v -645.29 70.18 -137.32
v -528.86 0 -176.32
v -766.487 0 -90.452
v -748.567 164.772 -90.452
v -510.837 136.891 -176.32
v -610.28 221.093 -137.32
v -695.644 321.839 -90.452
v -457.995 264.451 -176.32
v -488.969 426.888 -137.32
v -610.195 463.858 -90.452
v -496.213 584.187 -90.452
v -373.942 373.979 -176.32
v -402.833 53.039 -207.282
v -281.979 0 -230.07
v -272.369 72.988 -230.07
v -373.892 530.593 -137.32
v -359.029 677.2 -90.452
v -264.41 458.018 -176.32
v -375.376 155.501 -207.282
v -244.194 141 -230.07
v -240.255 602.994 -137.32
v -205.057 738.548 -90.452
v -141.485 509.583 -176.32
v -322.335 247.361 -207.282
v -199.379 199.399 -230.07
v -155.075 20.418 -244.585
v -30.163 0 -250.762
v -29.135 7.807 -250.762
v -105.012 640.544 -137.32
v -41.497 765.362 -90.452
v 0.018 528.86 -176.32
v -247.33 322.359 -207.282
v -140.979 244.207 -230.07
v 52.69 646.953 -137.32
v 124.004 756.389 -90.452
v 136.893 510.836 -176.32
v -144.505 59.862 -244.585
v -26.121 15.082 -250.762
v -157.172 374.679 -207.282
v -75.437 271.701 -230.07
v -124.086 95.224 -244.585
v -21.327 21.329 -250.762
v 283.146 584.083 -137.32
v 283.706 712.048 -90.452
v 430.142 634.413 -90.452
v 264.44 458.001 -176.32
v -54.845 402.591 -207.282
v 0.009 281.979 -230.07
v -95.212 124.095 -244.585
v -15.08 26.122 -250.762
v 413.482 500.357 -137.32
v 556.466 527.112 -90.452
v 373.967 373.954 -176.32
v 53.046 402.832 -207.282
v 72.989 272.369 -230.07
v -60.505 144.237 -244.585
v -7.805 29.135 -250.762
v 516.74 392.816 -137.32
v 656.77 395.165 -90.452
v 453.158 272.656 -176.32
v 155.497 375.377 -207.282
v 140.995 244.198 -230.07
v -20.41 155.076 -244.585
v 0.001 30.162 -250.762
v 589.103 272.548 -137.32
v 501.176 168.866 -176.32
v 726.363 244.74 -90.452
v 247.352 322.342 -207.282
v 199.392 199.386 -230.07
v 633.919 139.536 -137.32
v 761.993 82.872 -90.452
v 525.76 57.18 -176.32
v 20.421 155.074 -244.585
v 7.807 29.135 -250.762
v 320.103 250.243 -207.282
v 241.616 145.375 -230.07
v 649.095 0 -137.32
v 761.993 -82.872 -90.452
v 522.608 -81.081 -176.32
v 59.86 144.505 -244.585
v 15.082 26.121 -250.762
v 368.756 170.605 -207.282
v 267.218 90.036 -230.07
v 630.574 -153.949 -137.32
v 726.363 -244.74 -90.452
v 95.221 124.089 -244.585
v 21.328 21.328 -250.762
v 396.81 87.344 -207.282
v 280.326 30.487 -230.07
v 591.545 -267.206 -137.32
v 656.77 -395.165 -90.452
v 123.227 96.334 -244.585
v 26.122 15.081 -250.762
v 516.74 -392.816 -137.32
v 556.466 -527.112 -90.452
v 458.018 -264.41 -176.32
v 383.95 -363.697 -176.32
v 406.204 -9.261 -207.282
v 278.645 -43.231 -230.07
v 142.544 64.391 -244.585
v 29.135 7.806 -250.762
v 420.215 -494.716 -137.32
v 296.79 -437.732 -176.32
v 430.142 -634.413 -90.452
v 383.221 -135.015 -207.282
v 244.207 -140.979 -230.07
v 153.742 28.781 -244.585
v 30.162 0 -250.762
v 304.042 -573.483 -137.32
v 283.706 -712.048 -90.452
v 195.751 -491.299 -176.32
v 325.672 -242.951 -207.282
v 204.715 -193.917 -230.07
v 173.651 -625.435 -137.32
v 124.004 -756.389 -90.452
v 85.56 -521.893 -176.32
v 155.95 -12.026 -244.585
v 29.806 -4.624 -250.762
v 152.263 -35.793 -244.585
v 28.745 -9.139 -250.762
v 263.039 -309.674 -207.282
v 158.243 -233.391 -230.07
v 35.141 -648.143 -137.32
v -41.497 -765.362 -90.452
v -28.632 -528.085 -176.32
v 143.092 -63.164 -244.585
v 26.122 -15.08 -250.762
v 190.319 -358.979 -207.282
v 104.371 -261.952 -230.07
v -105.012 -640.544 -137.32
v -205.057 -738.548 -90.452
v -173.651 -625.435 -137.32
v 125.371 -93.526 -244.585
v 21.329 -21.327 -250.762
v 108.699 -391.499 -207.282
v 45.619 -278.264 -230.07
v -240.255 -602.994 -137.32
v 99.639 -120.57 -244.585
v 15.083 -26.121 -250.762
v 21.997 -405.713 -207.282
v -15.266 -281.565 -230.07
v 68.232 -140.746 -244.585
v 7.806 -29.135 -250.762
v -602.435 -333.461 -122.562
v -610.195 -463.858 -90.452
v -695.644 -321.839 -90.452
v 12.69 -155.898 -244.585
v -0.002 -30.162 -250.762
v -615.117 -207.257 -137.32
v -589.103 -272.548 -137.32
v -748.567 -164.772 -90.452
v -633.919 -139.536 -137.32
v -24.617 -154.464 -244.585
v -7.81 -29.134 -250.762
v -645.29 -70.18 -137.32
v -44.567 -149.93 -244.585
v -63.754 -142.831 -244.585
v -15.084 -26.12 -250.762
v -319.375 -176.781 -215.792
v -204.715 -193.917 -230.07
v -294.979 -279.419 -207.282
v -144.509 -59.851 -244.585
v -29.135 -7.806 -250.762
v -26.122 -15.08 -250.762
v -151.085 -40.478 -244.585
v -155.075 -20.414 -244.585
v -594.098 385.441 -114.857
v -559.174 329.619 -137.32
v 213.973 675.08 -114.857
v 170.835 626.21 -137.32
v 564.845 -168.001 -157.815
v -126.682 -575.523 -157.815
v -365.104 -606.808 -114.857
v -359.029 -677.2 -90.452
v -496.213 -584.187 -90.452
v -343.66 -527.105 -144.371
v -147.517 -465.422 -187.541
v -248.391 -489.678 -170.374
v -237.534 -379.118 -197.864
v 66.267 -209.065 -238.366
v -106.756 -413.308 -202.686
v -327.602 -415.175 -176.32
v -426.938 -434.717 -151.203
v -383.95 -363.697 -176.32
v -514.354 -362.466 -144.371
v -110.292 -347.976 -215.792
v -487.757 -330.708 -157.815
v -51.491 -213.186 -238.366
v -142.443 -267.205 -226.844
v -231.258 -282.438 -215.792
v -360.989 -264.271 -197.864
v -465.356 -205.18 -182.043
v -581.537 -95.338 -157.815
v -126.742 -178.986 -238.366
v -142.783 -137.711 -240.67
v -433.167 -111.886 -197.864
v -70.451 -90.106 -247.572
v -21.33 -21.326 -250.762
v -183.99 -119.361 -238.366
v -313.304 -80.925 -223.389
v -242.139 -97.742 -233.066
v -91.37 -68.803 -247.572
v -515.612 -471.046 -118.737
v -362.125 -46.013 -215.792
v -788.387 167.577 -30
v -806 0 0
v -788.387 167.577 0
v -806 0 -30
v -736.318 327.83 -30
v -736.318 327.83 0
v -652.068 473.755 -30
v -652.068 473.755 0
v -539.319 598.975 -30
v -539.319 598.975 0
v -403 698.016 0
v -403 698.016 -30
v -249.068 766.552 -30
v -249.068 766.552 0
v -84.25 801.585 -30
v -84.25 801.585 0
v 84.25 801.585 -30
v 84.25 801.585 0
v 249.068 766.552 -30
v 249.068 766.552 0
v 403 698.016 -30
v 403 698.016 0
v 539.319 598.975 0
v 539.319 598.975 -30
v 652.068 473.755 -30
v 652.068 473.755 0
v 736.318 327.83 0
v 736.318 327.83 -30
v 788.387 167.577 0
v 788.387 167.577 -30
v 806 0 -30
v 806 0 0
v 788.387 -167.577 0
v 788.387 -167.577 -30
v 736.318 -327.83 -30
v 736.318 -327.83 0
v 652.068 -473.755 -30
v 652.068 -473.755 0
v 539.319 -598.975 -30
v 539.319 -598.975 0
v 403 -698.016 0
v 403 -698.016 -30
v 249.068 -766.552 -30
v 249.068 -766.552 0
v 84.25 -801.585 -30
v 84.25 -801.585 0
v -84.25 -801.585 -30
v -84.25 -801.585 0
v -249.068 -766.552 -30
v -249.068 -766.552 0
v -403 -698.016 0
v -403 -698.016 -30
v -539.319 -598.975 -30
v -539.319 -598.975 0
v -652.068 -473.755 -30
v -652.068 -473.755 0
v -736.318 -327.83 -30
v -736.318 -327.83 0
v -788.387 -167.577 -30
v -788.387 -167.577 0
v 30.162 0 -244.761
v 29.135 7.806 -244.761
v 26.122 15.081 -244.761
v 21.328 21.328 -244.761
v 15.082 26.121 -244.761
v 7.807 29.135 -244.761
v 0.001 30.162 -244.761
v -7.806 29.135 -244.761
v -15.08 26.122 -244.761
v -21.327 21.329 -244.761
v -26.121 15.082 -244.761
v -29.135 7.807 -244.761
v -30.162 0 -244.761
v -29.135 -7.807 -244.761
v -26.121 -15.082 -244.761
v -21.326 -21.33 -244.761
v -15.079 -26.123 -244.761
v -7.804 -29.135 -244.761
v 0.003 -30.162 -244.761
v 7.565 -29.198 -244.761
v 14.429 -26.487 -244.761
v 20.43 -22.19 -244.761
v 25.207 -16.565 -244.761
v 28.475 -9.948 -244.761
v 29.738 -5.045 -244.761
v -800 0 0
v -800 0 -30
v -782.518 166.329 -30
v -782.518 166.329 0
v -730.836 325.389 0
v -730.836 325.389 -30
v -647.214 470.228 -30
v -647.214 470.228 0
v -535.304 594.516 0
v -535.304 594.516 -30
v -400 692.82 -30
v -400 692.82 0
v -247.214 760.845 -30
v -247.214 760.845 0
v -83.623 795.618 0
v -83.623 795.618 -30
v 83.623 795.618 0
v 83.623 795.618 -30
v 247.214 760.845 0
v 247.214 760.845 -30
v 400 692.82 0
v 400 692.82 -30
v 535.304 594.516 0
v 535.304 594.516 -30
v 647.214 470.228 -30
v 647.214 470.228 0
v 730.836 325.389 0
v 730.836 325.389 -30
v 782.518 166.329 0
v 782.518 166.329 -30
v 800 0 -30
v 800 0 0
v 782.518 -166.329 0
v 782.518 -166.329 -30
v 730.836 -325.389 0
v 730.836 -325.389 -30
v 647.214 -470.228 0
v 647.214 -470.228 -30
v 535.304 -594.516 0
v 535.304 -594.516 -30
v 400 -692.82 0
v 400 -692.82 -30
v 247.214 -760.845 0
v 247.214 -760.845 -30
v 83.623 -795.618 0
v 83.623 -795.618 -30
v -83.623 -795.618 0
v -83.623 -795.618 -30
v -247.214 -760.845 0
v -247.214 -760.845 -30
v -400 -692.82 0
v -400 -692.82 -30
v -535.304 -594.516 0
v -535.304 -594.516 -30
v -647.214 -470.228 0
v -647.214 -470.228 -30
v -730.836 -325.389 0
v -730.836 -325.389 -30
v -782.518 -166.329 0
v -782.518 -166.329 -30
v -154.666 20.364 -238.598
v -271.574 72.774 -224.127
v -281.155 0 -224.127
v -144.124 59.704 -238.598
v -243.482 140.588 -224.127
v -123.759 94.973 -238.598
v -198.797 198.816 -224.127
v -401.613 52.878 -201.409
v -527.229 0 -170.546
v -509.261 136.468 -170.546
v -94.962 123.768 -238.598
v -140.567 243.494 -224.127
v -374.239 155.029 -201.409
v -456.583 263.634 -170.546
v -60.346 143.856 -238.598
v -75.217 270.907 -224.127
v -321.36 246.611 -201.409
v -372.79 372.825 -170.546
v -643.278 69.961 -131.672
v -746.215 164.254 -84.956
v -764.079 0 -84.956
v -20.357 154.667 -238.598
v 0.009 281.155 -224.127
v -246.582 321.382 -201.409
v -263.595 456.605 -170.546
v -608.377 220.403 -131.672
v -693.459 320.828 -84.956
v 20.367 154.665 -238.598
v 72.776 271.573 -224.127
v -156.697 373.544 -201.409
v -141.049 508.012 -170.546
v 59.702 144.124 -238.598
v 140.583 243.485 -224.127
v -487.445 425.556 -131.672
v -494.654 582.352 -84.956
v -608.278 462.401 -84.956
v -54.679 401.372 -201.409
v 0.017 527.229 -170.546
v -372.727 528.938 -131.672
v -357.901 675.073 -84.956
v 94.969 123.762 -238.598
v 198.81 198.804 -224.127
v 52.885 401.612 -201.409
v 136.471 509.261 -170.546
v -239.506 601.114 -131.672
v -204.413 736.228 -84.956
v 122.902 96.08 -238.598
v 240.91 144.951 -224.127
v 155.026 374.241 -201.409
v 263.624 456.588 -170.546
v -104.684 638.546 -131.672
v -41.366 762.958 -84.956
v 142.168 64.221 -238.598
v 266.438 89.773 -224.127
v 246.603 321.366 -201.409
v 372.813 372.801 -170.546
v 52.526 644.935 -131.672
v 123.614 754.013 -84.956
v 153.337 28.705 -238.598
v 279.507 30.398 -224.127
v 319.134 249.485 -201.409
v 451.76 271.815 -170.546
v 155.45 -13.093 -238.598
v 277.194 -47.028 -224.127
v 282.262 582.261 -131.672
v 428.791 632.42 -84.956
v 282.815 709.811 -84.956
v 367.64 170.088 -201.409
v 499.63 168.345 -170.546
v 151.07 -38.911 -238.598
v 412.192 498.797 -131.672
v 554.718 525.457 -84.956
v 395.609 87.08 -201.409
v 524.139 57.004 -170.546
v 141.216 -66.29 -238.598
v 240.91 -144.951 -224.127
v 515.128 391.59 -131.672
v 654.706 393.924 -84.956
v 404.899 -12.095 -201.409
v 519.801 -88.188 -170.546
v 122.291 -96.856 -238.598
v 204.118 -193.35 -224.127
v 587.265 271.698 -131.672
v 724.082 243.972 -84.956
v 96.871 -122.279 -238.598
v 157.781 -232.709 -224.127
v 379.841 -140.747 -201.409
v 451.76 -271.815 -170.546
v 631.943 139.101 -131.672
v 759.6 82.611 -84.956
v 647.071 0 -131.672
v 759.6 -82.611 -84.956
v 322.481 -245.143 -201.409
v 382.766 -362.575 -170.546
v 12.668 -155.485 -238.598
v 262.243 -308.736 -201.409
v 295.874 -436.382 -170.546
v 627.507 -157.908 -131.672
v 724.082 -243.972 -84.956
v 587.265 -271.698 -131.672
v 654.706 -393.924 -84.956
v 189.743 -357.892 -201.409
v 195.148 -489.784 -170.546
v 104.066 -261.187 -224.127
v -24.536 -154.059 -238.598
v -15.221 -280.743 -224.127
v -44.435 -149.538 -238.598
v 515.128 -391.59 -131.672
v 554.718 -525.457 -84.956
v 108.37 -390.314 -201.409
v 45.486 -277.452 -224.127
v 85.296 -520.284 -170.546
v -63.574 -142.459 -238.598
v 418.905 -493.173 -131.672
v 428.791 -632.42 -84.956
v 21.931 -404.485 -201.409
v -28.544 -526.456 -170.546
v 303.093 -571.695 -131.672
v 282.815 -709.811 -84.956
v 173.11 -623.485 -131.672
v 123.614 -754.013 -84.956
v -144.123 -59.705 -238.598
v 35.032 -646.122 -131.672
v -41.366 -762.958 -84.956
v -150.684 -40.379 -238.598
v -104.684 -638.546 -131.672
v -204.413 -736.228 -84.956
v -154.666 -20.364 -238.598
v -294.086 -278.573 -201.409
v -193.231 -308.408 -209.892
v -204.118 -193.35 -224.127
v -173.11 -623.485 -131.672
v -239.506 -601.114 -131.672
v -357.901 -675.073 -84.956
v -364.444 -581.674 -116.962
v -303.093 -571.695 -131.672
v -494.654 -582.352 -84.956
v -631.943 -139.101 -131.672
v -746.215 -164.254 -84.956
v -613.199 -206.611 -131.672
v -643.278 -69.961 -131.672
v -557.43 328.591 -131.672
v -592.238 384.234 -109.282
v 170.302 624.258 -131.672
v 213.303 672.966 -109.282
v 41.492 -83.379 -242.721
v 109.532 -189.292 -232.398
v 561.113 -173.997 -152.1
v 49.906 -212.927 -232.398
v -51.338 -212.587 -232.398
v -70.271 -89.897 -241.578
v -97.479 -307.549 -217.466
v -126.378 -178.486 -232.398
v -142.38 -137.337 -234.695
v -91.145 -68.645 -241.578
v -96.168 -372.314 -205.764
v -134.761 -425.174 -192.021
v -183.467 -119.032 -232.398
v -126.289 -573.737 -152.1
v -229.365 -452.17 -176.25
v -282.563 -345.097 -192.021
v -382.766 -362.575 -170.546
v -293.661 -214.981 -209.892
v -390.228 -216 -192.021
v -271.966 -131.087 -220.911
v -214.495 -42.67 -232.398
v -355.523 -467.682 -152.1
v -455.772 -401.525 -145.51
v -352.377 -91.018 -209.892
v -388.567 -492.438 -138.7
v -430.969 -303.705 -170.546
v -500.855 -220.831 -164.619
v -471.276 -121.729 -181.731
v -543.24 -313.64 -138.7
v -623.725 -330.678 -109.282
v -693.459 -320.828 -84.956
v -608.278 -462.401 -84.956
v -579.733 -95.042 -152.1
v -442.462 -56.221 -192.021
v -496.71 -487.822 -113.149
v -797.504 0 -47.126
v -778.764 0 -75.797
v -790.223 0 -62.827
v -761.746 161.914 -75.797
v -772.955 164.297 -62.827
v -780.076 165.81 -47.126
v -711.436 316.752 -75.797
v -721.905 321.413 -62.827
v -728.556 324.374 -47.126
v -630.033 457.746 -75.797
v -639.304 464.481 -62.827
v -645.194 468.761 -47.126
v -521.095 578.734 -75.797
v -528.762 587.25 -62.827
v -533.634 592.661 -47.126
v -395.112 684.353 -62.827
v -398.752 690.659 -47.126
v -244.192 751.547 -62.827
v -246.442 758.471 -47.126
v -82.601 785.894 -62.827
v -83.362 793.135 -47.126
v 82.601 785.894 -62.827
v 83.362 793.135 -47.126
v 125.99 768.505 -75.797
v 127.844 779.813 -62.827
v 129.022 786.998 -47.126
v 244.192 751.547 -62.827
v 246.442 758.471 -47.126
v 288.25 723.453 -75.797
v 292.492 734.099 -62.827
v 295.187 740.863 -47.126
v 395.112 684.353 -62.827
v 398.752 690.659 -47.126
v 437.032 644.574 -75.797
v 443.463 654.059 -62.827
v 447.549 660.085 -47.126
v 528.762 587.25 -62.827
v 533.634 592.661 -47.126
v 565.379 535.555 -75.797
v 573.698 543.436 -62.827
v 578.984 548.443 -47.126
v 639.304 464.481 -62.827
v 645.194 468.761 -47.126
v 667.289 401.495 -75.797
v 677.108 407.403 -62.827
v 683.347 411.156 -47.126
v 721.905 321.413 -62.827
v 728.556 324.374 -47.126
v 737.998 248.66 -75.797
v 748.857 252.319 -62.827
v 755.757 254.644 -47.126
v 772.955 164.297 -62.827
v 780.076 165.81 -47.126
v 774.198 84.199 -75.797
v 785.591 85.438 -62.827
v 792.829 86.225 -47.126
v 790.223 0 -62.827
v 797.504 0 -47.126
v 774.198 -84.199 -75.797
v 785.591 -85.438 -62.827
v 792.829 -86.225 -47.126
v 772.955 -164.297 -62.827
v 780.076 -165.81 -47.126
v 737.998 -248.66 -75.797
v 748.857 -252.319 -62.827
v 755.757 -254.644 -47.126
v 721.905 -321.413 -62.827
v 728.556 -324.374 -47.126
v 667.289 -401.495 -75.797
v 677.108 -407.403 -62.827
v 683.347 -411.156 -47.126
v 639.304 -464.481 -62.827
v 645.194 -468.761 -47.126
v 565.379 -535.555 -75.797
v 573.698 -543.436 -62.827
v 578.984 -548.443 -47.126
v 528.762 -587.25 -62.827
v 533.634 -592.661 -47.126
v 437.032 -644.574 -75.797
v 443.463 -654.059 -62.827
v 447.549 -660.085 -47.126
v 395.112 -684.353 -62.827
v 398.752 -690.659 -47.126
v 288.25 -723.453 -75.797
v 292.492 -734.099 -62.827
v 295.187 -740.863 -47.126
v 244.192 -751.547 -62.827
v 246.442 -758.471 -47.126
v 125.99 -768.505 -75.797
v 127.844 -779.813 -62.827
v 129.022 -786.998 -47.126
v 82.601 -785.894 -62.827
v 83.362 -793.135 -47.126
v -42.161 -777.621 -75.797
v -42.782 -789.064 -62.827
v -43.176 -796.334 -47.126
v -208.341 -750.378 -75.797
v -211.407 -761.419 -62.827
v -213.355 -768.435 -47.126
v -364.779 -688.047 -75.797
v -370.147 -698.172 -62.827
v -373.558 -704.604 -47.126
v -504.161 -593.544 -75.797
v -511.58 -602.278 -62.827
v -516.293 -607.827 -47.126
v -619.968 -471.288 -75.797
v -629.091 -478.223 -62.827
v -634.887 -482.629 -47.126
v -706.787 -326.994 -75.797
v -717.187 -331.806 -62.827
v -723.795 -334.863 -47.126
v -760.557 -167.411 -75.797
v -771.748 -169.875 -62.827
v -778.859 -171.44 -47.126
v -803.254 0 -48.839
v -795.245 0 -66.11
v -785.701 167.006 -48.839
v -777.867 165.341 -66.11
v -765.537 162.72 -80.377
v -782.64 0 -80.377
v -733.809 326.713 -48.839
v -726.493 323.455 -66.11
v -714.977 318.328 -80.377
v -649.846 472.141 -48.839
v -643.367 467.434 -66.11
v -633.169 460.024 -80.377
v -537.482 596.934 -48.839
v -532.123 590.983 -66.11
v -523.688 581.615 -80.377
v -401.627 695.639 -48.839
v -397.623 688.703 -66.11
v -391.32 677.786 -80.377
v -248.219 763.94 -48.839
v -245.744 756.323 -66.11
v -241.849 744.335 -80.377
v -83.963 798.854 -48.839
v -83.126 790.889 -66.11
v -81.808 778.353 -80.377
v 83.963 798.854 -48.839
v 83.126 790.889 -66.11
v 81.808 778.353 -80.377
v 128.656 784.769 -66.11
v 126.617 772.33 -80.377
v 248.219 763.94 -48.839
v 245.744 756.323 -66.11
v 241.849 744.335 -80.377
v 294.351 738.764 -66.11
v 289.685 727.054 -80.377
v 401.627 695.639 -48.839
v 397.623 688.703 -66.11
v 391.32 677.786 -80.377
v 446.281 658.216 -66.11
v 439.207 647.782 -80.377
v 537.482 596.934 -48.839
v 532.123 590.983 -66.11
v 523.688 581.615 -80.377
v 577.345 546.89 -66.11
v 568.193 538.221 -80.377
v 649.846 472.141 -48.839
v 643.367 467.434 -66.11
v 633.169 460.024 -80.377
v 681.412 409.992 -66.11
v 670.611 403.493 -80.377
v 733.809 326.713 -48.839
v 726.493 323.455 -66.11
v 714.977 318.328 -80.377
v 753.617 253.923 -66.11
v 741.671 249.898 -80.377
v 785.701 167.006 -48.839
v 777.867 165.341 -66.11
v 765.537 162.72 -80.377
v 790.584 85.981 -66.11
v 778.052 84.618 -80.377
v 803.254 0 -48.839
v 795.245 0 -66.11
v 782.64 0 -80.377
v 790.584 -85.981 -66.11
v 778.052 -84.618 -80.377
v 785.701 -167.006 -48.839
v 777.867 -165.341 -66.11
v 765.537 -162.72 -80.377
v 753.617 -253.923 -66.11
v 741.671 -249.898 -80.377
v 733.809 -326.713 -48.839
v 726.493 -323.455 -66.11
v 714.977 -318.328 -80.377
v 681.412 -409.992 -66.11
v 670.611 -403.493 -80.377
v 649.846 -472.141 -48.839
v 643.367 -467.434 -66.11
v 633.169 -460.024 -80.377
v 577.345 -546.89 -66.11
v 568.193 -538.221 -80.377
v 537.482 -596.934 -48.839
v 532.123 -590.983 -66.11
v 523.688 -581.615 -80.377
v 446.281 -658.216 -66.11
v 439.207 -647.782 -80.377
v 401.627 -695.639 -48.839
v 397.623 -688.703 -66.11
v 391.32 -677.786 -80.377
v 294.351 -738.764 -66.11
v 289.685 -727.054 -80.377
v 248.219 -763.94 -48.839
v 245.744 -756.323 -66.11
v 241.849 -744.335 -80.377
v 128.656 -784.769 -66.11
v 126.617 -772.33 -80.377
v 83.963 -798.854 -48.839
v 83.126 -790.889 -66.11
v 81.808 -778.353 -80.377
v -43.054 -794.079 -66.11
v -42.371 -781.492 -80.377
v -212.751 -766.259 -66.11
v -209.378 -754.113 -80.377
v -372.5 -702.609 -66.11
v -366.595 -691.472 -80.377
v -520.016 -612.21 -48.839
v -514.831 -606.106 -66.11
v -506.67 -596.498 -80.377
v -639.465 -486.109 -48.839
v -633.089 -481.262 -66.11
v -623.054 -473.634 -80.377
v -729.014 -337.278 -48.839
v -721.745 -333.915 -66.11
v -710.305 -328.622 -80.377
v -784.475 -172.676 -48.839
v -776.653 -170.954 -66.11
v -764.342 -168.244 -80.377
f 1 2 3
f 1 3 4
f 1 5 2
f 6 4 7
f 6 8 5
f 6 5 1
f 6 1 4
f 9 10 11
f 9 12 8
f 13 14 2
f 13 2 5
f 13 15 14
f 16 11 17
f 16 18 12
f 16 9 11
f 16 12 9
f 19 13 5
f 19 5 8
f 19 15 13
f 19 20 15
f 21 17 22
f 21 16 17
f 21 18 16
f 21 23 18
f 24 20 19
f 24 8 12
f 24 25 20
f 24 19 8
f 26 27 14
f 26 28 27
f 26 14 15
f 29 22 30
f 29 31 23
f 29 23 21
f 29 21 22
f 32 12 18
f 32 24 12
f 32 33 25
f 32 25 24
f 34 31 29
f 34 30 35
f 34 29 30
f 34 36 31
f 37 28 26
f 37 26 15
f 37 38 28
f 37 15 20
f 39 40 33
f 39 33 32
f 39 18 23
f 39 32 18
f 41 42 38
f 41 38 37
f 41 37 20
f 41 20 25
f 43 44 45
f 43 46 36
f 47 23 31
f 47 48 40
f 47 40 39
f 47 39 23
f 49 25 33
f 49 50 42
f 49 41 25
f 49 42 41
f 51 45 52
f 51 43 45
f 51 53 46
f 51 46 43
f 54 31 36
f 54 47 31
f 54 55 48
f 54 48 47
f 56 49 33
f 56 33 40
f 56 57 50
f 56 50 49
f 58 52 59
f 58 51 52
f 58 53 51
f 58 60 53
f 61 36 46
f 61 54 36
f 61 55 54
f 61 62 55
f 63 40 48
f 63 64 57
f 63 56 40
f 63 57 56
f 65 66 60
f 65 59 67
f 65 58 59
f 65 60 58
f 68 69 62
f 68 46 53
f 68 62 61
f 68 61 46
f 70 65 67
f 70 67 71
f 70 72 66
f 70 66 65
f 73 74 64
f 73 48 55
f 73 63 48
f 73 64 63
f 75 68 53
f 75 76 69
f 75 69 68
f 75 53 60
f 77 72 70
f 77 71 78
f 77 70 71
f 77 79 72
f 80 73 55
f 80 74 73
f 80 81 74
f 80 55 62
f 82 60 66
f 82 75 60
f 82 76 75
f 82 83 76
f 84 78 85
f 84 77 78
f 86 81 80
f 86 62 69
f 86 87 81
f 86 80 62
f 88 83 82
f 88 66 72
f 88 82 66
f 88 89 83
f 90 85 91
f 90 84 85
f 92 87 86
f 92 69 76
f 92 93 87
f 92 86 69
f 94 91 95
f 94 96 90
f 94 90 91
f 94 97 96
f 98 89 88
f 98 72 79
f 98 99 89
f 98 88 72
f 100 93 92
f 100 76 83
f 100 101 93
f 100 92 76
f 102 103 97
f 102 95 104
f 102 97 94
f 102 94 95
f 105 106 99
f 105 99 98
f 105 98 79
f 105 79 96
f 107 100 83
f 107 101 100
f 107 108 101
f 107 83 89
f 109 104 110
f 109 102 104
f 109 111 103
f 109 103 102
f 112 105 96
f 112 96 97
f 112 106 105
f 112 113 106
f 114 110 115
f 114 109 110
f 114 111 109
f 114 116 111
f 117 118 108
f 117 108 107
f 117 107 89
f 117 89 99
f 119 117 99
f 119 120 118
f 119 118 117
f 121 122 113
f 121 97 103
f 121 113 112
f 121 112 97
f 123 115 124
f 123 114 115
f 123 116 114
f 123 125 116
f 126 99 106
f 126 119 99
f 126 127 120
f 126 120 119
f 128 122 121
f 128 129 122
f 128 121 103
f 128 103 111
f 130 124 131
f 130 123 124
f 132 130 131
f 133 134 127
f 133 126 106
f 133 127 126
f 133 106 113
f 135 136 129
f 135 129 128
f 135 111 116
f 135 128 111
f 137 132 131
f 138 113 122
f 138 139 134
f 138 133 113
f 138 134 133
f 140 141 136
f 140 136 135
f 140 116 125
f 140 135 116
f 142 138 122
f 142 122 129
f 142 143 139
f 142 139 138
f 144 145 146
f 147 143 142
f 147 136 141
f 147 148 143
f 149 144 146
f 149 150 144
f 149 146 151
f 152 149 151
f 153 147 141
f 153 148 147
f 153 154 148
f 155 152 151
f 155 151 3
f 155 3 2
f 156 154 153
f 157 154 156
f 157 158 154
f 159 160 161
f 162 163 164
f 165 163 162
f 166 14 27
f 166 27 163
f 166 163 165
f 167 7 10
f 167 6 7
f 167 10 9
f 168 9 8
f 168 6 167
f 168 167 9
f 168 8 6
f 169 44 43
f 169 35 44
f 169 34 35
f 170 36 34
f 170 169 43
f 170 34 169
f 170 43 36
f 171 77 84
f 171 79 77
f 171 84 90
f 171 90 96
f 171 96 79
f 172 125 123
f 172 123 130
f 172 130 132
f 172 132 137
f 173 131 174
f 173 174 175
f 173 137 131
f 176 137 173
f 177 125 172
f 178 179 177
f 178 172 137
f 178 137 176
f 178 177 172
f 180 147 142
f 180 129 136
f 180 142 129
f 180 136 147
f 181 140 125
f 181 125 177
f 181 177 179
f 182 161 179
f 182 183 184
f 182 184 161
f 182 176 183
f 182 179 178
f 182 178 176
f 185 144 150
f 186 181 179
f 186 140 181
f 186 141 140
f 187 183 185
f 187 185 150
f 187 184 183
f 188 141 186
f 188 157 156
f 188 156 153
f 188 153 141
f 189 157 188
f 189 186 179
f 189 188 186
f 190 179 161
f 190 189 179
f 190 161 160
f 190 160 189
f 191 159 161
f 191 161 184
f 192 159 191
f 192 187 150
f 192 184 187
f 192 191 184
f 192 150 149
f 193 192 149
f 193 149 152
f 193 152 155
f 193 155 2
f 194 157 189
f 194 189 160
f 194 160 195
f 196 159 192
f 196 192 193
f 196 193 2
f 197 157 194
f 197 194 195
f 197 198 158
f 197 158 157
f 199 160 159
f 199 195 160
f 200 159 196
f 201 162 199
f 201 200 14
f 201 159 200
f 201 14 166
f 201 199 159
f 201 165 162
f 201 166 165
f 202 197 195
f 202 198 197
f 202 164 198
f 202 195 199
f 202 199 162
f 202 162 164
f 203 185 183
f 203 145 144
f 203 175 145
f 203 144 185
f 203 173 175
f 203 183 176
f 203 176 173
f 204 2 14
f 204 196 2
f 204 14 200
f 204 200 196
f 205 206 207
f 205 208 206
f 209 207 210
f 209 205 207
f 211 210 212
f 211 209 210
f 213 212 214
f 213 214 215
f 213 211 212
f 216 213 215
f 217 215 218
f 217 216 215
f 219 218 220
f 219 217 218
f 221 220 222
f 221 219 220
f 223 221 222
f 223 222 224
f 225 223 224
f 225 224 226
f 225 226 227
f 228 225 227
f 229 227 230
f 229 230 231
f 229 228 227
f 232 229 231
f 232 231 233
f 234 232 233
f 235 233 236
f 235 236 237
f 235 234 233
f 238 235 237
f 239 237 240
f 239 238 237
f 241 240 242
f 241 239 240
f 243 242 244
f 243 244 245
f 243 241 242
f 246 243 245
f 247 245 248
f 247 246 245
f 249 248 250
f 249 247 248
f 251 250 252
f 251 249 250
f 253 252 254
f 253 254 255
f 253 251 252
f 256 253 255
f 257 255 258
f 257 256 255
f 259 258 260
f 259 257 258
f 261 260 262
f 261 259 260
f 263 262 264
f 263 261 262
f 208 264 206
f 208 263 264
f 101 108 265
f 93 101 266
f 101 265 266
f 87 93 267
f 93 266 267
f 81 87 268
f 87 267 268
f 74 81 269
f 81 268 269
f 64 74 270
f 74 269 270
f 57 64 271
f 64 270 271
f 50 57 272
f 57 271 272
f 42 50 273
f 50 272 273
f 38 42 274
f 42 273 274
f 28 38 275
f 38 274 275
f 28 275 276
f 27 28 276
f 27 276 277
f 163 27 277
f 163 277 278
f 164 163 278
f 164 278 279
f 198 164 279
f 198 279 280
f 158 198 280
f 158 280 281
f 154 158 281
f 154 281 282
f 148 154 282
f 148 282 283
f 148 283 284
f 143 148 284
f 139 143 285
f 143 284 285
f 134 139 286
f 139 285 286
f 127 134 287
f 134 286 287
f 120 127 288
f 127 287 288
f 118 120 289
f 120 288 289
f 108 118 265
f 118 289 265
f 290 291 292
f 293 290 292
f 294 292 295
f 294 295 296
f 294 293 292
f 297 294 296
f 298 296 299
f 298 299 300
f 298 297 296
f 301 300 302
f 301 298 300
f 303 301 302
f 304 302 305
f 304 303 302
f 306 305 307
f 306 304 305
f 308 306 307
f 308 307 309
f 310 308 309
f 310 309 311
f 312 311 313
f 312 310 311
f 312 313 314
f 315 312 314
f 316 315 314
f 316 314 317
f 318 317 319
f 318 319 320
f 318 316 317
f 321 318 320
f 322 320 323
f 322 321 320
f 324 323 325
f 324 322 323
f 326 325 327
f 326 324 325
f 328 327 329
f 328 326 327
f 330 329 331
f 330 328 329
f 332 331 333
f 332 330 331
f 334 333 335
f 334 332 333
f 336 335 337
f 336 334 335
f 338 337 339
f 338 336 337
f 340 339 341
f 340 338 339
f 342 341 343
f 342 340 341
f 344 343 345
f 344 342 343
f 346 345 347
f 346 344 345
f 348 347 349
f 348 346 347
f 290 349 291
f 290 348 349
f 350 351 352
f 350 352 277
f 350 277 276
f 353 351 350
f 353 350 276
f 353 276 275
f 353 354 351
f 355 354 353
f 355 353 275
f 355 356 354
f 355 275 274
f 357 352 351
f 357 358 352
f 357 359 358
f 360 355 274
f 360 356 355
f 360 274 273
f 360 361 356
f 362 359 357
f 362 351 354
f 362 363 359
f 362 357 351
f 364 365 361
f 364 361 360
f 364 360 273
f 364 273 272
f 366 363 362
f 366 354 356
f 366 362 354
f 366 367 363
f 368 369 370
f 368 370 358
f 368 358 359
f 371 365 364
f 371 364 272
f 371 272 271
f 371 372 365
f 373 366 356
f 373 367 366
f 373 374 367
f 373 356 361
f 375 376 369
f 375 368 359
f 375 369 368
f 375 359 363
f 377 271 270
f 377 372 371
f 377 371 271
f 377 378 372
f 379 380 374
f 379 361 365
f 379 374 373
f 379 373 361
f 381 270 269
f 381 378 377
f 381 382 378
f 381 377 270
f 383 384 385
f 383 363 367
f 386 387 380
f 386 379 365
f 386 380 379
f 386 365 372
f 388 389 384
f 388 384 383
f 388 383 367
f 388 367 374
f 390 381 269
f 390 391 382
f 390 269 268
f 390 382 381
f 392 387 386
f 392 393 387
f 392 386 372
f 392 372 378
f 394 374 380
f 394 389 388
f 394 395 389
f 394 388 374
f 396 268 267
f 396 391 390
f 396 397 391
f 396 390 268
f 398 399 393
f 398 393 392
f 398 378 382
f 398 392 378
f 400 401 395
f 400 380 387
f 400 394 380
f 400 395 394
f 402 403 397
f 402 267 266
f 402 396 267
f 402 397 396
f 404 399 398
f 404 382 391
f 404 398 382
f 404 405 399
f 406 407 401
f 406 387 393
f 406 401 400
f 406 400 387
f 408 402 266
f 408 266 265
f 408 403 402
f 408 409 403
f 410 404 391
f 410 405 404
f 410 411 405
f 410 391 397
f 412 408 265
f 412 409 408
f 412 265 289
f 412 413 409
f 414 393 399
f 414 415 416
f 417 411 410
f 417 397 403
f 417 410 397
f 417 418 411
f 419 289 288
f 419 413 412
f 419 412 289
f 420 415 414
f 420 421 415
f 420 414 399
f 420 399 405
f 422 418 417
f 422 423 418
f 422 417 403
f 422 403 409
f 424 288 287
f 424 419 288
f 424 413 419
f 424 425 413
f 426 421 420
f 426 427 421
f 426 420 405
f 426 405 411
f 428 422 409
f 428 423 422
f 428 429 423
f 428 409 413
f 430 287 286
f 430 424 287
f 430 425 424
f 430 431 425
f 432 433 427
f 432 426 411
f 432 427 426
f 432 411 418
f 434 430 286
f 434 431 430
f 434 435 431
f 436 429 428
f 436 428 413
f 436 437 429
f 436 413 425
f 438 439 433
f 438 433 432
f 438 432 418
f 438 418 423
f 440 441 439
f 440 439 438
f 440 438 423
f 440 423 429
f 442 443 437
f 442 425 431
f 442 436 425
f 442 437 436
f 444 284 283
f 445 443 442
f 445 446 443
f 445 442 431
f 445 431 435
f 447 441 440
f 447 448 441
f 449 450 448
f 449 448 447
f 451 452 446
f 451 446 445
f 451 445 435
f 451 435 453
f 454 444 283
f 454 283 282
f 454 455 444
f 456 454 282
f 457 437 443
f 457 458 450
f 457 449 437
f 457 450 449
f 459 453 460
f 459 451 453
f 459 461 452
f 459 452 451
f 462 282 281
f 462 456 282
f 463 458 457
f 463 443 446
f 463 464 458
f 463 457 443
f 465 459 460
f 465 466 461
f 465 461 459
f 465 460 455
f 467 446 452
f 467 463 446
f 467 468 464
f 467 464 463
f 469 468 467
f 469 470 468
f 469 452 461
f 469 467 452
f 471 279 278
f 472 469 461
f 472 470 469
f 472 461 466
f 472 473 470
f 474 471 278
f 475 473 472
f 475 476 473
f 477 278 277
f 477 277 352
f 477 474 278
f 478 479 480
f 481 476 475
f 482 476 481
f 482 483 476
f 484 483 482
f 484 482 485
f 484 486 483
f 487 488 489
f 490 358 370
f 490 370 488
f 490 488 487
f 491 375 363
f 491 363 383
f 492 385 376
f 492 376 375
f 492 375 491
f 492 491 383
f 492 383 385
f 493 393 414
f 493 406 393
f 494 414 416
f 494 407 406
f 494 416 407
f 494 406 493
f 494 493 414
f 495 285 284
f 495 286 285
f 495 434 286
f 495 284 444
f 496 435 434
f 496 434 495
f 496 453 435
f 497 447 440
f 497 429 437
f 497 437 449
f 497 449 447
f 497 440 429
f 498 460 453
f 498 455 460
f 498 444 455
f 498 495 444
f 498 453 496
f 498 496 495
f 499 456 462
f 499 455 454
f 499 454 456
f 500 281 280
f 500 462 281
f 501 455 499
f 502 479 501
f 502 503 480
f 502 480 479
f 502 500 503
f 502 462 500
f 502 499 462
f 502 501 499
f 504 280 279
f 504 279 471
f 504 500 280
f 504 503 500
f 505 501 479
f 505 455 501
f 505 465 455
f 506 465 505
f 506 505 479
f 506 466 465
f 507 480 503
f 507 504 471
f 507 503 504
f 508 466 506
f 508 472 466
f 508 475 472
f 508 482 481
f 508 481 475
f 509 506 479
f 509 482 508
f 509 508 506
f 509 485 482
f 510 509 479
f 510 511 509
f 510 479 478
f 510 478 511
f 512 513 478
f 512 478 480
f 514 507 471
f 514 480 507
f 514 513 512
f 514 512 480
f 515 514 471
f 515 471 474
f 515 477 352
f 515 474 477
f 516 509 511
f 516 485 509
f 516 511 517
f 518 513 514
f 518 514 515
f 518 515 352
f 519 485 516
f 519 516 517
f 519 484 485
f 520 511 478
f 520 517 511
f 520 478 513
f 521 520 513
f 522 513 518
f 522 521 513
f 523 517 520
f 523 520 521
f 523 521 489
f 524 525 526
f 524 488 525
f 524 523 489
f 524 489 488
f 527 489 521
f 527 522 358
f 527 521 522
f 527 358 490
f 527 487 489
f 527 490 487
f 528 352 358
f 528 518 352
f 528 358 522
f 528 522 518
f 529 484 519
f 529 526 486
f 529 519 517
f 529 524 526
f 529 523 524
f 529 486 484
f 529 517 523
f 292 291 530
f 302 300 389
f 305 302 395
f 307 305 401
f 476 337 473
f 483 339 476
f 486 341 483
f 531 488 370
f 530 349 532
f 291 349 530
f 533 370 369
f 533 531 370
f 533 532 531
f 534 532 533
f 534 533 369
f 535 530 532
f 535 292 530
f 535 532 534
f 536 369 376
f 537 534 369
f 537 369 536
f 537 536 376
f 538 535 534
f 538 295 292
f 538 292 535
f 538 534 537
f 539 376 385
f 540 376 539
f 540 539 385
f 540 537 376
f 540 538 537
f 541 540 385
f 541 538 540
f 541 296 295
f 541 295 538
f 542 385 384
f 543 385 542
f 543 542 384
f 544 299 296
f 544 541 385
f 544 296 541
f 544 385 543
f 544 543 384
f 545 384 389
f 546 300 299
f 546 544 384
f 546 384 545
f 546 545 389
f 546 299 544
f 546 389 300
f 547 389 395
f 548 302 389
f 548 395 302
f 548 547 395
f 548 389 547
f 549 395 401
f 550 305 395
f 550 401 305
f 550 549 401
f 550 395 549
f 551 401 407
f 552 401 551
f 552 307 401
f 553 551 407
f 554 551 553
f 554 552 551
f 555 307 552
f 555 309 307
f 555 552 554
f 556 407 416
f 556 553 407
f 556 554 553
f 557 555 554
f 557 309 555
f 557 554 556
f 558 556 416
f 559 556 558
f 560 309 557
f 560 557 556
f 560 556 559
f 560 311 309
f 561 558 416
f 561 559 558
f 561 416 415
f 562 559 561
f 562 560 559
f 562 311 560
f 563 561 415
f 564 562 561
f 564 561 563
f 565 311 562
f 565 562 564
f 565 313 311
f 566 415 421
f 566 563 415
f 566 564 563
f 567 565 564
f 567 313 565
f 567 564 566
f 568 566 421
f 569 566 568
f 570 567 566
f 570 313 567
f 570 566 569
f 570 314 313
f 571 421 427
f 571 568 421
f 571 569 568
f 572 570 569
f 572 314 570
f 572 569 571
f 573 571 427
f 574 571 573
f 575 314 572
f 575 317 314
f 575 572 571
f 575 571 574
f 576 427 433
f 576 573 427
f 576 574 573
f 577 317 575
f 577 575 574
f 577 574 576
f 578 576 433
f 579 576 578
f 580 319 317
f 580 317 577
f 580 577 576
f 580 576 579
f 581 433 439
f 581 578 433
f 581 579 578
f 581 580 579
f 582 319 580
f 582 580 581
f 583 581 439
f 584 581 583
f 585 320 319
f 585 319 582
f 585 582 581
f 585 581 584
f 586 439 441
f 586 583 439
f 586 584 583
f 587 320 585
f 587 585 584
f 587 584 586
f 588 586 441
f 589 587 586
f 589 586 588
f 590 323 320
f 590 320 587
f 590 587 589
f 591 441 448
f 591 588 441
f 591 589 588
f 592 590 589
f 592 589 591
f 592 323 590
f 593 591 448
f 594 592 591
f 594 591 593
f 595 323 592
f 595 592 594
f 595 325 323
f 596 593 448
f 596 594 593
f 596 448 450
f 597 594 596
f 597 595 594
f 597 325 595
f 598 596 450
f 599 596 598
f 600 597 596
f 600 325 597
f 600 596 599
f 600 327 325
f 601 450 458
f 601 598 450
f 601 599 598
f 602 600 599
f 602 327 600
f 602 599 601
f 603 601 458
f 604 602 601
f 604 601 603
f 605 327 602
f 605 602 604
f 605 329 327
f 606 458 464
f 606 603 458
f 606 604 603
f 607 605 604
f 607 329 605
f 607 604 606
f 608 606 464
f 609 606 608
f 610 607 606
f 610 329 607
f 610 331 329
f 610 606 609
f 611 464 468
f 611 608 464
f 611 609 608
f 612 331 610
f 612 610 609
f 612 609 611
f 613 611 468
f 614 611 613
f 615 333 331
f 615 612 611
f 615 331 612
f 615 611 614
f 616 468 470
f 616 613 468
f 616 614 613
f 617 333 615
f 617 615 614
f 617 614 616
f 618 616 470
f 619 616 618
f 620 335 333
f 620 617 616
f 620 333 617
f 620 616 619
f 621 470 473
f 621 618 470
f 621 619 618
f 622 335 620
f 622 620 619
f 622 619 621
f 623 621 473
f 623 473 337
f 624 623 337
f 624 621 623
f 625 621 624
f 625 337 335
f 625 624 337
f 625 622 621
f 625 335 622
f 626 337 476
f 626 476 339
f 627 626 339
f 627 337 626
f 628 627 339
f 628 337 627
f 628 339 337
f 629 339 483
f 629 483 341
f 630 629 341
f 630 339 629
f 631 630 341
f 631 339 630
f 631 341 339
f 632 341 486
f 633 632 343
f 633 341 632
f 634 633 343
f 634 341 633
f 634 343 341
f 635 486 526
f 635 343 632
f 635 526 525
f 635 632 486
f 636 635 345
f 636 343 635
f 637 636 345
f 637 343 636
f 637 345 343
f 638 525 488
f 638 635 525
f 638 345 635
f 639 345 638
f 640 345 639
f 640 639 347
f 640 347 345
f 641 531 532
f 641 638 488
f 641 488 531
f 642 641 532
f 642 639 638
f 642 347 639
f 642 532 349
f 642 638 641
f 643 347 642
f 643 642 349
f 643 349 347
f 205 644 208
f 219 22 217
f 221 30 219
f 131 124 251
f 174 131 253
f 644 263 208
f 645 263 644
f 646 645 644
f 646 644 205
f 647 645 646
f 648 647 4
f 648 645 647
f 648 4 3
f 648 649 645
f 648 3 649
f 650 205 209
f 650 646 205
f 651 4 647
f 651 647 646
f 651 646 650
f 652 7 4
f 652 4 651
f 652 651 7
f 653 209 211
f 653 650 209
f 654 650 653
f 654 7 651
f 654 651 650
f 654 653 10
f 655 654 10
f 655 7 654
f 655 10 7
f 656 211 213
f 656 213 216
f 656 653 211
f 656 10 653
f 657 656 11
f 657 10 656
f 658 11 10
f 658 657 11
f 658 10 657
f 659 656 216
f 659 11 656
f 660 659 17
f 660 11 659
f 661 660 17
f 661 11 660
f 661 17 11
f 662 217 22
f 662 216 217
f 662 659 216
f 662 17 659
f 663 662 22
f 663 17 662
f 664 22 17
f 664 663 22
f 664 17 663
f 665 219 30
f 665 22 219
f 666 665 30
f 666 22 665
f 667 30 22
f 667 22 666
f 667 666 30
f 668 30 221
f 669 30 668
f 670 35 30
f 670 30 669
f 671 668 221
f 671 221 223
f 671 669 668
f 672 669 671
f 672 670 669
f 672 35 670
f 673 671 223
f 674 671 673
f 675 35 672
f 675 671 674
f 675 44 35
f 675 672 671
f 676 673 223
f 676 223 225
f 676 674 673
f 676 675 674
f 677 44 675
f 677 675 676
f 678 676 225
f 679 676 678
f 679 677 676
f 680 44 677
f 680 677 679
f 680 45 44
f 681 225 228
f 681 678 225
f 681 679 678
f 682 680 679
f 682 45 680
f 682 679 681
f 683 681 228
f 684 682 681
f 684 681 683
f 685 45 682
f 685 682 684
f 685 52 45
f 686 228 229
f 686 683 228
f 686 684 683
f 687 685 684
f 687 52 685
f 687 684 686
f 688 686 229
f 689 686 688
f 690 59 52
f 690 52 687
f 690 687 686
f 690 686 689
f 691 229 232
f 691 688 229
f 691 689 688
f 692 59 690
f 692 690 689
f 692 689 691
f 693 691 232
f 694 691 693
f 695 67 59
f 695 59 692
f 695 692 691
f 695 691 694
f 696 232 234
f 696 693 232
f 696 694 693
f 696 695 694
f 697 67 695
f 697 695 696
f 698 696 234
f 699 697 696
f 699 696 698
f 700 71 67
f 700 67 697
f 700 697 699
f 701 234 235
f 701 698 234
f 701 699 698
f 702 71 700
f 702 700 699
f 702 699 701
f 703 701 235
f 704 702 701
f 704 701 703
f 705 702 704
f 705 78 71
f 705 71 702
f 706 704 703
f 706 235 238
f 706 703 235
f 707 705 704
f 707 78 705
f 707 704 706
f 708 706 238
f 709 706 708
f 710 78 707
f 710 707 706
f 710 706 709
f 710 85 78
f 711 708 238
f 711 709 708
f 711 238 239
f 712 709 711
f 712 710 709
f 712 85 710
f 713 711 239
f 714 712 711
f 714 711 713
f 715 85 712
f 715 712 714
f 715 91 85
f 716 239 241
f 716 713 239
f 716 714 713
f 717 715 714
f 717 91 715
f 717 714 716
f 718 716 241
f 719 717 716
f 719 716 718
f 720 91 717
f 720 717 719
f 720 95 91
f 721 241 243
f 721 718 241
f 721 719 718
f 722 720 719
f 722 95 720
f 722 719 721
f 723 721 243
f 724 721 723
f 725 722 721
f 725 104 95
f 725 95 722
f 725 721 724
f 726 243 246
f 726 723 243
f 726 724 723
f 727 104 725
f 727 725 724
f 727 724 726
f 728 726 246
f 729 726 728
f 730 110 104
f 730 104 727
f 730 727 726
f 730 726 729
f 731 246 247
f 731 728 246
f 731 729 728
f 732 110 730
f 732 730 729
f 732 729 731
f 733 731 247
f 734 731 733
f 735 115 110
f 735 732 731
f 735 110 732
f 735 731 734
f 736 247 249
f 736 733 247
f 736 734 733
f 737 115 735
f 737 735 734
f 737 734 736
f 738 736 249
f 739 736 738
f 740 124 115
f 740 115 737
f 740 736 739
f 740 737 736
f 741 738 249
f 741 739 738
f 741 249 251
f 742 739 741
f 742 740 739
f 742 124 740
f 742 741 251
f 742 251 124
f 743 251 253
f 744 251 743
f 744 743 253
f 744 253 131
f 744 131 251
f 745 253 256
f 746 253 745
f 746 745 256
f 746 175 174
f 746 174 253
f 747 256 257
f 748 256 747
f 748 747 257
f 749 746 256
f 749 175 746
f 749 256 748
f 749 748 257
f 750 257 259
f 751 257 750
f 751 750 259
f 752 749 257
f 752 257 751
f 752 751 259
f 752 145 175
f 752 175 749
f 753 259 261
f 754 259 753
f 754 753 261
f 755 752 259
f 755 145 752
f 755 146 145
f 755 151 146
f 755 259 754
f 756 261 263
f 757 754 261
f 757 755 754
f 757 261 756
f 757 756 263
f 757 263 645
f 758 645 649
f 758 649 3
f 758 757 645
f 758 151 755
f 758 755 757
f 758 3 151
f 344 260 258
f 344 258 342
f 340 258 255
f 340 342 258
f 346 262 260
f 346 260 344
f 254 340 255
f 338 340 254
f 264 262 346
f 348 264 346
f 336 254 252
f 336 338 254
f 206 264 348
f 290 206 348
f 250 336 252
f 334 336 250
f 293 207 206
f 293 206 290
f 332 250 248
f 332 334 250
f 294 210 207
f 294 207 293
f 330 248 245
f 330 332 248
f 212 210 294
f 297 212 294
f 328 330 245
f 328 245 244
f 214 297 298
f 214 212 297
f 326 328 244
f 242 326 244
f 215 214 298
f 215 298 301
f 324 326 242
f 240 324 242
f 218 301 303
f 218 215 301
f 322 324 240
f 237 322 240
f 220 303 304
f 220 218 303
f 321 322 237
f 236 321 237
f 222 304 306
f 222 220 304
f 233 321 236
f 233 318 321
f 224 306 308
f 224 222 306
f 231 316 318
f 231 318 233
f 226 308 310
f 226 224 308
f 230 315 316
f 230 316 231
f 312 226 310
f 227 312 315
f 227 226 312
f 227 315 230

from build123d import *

# Parameters (mm, degrees)
F2_R     = 30.1625
F3_DEPTH = 251.001


with BuildPart() as f1:
    # F0 (on Front) → F1 (revolve)
    with BuildSketch(Plane.XZ):
        with BuildLine():
            Line((-800, -30), (-800, 0))
            Line((-800, 0), (-806, 0))
            Line((-806, 0), (-806, -30))
            ThreePointArc((-806, -30), (-795.245431, -66.110142), (-766.486595, -90.452132))
            ThreePointArc((-766.486595, -90.452132), (-391.560123, -210.432198), (0, -251))
            Line((0, -251), (0, -245))
            ThreePointArc((0, -245), (-390.33006, -204.55964), (-764.078723, -84.956484))
            ThreePointArc((-764.078723, -84.956484), (-790.223119, -62.827402), (-800, -30))
        make_face()
    revolve(axis=Axis((0, 0, -122.5), (0, 0, -1)))

    # F2 (on Top) → F3 (cut, through all)
    with BuildSketch(Plane.XY):
        Circle(F2_R)
    extrude(amount=-F3_DEPTH, mode=Mode.SUBTRACT)


solid = f1.part
